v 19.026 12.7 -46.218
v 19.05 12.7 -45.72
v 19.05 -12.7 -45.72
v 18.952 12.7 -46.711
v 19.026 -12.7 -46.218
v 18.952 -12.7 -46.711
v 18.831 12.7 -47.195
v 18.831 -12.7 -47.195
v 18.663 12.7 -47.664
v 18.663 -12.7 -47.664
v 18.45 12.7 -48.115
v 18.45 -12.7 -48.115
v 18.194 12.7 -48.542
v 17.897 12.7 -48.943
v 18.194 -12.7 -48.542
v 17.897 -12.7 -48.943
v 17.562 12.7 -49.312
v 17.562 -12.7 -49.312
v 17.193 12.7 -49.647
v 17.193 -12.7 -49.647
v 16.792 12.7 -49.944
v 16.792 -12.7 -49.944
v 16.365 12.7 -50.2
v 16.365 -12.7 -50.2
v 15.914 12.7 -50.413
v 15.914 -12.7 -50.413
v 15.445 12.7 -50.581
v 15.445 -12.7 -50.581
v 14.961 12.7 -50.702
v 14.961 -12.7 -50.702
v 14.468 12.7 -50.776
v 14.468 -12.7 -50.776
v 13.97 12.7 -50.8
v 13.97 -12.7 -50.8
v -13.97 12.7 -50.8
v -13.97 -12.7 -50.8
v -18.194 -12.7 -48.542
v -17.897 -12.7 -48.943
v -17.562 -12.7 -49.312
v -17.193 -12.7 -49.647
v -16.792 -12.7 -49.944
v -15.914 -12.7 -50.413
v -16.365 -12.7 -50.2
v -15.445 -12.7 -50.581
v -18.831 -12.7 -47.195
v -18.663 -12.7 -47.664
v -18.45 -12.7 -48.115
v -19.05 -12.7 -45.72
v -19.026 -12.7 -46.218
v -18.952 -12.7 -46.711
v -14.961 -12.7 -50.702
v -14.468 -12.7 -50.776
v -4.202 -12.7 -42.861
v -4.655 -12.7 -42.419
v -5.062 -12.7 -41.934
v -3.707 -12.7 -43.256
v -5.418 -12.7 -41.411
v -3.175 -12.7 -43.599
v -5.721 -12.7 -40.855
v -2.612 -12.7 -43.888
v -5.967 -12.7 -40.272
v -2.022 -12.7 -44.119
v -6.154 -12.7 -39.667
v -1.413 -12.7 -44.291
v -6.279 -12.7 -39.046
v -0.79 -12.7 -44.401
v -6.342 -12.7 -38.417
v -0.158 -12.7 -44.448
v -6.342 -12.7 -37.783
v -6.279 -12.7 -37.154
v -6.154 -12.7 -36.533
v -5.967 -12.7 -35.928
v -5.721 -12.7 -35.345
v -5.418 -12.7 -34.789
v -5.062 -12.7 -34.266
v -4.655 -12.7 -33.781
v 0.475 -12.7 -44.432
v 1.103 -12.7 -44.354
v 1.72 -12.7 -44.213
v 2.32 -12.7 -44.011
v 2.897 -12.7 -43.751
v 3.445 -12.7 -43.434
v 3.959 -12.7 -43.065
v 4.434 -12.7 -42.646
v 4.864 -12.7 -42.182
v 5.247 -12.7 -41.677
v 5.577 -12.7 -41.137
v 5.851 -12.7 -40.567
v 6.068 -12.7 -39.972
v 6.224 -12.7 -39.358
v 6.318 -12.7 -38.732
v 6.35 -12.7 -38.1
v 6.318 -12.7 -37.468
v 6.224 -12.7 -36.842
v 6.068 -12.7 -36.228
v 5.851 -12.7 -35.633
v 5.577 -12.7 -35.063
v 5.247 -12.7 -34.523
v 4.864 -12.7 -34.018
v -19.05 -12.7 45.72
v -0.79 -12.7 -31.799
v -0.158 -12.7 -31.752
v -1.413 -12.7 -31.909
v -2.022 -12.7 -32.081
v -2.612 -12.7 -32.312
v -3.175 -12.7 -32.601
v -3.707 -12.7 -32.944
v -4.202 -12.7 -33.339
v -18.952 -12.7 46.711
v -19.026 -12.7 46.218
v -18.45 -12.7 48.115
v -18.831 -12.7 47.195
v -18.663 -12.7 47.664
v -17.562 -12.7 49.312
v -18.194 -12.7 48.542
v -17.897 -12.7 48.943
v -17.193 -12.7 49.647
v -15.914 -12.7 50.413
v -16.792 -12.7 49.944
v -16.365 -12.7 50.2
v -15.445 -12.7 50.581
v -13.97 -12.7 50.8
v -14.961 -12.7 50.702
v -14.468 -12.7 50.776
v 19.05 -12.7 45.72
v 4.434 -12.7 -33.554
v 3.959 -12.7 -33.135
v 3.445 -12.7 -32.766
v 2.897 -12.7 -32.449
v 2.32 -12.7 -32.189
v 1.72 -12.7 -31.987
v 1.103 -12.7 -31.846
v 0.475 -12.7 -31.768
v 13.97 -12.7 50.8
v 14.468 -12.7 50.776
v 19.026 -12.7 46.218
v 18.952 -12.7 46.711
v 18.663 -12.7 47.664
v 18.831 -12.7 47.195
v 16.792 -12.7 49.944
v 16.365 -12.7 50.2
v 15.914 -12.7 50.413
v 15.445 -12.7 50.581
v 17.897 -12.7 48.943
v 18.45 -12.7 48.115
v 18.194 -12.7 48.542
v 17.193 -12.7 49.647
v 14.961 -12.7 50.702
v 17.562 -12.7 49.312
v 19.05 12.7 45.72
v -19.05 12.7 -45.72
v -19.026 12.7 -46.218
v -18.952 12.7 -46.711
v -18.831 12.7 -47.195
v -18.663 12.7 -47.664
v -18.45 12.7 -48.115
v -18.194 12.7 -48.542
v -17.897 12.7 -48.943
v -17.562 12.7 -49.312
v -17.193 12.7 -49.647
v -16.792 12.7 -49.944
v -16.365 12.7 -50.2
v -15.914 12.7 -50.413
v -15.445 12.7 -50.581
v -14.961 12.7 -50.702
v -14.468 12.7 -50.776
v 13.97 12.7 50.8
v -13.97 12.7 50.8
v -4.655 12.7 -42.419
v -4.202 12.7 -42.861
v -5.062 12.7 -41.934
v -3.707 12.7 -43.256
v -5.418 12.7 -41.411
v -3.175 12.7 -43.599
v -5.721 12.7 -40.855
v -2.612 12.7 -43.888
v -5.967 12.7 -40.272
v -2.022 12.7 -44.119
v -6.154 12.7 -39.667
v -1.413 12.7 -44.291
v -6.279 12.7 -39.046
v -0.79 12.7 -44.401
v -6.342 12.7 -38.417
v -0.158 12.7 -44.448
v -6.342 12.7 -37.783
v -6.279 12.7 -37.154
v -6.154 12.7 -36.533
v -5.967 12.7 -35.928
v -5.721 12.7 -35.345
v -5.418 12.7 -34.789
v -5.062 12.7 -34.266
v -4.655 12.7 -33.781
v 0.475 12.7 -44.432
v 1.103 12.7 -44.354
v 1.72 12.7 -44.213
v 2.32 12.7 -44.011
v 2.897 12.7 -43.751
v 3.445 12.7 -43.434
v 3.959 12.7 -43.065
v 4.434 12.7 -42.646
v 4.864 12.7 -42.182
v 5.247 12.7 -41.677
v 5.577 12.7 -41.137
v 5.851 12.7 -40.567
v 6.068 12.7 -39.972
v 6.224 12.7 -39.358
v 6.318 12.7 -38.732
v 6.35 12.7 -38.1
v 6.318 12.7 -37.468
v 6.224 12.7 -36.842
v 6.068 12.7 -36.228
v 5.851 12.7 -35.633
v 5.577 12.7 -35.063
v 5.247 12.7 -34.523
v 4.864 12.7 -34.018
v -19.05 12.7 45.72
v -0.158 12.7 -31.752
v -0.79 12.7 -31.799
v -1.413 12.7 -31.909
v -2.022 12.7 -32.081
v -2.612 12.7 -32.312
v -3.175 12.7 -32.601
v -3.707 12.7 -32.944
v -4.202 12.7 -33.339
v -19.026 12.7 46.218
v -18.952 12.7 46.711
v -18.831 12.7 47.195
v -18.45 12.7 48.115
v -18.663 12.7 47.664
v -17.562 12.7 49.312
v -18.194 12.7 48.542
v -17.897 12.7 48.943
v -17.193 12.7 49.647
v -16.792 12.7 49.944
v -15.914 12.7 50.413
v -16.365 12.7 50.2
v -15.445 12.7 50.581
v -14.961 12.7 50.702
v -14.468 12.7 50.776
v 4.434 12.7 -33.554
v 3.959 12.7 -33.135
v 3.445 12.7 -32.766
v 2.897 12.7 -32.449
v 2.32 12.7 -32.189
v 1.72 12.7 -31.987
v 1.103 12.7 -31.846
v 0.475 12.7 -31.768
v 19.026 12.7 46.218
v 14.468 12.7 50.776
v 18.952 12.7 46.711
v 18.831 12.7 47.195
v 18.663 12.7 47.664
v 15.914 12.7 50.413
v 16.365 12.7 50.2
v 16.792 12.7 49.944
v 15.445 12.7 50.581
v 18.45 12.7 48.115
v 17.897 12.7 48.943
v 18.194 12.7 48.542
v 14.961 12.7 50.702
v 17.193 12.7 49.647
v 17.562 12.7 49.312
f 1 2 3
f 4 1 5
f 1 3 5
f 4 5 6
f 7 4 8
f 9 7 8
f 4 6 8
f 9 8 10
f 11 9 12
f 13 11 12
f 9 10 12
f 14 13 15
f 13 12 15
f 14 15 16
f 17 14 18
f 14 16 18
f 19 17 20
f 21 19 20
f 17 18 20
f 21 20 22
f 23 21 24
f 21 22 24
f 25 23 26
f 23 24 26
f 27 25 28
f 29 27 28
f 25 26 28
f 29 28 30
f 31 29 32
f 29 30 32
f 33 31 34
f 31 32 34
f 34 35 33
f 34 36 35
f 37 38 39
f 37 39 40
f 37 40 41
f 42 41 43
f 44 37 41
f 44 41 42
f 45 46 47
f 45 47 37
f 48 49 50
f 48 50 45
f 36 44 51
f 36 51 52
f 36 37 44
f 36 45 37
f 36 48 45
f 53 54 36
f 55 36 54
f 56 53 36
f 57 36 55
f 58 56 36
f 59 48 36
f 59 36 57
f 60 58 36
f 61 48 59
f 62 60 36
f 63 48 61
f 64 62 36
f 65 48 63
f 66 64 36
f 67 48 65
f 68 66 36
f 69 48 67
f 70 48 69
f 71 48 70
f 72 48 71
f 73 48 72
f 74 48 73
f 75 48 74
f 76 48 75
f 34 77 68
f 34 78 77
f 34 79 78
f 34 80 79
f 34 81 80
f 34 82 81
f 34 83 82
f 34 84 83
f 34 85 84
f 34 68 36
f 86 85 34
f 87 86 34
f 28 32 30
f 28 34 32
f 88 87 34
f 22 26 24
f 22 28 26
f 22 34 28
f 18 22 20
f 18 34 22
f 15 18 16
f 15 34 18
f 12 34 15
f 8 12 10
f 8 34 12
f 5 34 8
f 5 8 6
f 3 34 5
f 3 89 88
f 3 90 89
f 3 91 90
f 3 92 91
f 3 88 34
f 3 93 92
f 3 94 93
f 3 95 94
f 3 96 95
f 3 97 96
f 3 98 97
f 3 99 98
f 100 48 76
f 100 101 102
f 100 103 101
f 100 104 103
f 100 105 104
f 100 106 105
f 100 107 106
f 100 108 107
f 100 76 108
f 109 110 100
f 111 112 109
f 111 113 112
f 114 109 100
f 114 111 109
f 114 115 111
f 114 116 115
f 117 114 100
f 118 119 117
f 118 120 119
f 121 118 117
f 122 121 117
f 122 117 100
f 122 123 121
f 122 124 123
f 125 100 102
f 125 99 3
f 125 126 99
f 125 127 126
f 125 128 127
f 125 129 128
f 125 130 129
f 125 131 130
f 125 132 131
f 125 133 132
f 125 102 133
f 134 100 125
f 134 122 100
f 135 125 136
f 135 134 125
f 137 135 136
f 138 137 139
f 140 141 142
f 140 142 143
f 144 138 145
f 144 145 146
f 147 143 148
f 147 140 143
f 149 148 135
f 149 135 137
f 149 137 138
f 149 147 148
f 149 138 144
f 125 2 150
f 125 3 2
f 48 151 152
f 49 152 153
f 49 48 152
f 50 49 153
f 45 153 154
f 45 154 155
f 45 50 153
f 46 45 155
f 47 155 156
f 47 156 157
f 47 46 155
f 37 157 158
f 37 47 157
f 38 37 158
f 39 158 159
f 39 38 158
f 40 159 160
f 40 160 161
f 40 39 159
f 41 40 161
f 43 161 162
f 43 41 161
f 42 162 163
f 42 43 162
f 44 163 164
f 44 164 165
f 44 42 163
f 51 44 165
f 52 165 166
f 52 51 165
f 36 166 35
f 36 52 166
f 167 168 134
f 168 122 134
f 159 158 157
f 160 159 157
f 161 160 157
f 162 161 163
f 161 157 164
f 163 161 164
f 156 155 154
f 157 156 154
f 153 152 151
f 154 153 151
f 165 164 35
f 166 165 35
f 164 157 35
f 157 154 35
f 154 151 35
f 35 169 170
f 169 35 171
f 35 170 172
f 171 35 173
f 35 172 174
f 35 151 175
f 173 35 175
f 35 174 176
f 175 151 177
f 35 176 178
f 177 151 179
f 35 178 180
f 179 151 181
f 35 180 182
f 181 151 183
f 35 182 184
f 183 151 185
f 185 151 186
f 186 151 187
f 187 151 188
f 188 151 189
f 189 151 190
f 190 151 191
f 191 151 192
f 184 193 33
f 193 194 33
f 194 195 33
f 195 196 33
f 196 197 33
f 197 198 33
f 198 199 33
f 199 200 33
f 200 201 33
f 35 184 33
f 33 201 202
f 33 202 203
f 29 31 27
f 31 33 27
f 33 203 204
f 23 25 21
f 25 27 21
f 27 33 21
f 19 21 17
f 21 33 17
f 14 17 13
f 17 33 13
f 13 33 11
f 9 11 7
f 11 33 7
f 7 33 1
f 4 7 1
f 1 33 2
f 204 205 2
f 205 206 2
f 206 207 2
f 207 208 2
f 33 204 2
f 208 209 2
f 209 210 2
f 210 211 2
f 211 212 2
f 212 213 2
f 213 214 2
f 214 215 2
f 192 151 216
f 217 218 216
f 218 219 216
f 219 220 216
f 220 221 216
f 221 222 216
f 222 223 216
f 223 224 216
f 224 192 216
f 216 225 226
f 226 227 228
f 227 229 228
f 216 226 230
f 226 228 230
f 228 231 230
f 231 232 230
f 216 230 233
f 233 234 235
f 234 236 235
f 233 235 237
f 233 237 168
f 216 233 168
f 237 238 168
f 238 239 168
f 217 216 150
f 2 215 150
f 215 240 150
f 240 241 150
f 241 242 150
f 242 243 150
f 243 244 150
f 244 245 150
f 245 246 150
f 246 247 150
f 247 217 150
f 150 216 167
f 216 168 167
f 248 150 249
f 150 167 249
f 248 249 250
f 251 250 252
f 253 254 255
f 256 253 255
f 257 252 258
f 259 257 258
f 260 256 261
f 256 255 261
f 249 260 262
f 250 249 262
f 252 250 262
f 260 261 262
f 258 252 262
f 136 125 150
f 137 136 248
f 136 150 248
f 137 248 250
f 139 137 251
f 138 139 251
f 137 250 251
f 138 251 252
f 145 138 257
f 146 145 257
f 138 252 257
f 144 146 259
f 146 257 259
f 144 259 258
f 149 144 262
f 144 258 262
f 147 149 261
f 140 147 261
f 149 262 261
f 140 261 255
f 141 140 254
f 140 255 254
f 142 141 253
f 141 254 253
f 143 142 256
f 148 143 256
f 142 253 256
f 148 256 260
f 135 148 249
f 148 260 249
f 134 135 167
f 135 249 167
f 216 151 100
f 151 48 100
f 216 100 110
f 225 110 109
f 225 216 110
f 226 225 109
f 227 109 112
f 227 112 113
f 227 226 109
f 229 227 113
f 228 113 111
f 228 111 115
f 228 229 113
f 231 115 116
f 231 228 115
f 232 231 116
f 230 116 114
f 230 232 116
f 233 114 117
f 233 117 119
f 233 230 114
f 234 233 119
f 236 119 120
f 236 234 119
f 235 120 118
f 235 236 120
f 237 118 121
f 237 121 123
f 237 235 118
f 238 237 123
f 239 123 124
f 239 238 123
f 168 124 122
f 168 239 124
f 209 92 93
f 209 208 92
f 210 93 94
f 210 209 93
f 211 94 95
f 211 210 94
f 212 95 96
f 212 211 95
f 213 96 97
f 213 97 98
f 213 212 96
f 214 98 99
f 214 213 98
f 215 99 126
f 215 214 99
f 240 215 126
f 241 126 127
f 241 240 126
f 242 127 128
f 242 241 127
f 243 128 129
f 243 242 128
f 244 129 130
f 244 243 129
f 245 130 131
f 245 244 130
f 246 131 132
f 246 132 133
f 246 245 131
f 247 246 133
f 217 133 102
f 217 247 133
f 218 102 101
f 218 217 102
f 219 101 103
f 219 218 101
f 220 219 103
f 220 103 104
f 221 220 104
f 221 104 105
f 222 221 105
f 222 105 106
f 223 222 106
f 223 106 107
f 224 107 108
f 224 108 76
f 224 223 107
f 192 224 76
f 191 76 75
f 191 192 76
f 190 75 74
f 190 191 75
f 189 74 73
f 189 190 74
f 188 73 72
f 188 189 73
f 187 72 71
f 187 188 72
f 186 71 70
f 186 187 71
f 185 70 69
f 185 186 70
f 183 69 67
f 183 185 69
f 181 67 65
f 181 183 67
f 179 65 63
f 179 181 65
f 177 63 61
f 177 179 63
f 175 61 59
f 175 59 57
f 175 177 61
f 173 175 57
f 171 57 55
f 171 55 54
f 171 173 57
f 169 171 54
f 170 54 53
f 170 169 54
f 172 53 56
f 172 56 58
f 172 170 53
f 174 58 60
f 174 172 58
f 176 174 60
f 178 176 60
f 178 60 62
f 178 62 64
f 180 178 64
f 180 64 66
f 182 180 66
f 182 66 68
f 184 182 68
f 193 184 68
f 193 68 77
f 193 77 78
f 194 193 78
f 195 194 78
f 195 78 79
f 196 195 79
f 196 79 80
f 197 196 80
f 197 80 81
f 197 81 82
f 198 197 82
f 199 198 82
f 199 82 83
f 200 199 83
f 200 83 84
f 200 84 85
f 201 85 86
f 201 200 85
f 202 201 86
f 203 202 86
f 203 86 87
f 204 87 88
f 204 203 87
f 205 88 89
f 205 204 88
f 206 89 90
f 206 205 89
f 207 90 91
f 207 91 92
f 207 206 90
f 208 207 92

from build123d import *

# Parameters (mm, degrees)
F0_W     = 38.1
F0_H     = 101.6
F0_R     = 6.35
F1_DEPTH = 12.7
F2_R     = 5.08


with BuildPart() as f1:
    # F0 (on Front) → F1 (new body, symmetric)
    with BuildSketch(Plane.XZ):
        Rectangle(F0_W, F0_H)
        with Locations((0, -38.1)):
            Circle(F0_R, mode=Mode.SUBTRACT)
    extrude(amount=F1_DEPTH, both=True)

    # F2
    f2_edges = [f1.edges().sort_by_distance(p)[0] for p in [
        (-19.05, 0, 50.8),
        (19.05, 0, 50.8),
        (19.05, 0, -50.8),
        (-19.05, 0, -50.8),
    ]]
    fillet(f2_edges, radius=F2_R)


solid = f1.part
